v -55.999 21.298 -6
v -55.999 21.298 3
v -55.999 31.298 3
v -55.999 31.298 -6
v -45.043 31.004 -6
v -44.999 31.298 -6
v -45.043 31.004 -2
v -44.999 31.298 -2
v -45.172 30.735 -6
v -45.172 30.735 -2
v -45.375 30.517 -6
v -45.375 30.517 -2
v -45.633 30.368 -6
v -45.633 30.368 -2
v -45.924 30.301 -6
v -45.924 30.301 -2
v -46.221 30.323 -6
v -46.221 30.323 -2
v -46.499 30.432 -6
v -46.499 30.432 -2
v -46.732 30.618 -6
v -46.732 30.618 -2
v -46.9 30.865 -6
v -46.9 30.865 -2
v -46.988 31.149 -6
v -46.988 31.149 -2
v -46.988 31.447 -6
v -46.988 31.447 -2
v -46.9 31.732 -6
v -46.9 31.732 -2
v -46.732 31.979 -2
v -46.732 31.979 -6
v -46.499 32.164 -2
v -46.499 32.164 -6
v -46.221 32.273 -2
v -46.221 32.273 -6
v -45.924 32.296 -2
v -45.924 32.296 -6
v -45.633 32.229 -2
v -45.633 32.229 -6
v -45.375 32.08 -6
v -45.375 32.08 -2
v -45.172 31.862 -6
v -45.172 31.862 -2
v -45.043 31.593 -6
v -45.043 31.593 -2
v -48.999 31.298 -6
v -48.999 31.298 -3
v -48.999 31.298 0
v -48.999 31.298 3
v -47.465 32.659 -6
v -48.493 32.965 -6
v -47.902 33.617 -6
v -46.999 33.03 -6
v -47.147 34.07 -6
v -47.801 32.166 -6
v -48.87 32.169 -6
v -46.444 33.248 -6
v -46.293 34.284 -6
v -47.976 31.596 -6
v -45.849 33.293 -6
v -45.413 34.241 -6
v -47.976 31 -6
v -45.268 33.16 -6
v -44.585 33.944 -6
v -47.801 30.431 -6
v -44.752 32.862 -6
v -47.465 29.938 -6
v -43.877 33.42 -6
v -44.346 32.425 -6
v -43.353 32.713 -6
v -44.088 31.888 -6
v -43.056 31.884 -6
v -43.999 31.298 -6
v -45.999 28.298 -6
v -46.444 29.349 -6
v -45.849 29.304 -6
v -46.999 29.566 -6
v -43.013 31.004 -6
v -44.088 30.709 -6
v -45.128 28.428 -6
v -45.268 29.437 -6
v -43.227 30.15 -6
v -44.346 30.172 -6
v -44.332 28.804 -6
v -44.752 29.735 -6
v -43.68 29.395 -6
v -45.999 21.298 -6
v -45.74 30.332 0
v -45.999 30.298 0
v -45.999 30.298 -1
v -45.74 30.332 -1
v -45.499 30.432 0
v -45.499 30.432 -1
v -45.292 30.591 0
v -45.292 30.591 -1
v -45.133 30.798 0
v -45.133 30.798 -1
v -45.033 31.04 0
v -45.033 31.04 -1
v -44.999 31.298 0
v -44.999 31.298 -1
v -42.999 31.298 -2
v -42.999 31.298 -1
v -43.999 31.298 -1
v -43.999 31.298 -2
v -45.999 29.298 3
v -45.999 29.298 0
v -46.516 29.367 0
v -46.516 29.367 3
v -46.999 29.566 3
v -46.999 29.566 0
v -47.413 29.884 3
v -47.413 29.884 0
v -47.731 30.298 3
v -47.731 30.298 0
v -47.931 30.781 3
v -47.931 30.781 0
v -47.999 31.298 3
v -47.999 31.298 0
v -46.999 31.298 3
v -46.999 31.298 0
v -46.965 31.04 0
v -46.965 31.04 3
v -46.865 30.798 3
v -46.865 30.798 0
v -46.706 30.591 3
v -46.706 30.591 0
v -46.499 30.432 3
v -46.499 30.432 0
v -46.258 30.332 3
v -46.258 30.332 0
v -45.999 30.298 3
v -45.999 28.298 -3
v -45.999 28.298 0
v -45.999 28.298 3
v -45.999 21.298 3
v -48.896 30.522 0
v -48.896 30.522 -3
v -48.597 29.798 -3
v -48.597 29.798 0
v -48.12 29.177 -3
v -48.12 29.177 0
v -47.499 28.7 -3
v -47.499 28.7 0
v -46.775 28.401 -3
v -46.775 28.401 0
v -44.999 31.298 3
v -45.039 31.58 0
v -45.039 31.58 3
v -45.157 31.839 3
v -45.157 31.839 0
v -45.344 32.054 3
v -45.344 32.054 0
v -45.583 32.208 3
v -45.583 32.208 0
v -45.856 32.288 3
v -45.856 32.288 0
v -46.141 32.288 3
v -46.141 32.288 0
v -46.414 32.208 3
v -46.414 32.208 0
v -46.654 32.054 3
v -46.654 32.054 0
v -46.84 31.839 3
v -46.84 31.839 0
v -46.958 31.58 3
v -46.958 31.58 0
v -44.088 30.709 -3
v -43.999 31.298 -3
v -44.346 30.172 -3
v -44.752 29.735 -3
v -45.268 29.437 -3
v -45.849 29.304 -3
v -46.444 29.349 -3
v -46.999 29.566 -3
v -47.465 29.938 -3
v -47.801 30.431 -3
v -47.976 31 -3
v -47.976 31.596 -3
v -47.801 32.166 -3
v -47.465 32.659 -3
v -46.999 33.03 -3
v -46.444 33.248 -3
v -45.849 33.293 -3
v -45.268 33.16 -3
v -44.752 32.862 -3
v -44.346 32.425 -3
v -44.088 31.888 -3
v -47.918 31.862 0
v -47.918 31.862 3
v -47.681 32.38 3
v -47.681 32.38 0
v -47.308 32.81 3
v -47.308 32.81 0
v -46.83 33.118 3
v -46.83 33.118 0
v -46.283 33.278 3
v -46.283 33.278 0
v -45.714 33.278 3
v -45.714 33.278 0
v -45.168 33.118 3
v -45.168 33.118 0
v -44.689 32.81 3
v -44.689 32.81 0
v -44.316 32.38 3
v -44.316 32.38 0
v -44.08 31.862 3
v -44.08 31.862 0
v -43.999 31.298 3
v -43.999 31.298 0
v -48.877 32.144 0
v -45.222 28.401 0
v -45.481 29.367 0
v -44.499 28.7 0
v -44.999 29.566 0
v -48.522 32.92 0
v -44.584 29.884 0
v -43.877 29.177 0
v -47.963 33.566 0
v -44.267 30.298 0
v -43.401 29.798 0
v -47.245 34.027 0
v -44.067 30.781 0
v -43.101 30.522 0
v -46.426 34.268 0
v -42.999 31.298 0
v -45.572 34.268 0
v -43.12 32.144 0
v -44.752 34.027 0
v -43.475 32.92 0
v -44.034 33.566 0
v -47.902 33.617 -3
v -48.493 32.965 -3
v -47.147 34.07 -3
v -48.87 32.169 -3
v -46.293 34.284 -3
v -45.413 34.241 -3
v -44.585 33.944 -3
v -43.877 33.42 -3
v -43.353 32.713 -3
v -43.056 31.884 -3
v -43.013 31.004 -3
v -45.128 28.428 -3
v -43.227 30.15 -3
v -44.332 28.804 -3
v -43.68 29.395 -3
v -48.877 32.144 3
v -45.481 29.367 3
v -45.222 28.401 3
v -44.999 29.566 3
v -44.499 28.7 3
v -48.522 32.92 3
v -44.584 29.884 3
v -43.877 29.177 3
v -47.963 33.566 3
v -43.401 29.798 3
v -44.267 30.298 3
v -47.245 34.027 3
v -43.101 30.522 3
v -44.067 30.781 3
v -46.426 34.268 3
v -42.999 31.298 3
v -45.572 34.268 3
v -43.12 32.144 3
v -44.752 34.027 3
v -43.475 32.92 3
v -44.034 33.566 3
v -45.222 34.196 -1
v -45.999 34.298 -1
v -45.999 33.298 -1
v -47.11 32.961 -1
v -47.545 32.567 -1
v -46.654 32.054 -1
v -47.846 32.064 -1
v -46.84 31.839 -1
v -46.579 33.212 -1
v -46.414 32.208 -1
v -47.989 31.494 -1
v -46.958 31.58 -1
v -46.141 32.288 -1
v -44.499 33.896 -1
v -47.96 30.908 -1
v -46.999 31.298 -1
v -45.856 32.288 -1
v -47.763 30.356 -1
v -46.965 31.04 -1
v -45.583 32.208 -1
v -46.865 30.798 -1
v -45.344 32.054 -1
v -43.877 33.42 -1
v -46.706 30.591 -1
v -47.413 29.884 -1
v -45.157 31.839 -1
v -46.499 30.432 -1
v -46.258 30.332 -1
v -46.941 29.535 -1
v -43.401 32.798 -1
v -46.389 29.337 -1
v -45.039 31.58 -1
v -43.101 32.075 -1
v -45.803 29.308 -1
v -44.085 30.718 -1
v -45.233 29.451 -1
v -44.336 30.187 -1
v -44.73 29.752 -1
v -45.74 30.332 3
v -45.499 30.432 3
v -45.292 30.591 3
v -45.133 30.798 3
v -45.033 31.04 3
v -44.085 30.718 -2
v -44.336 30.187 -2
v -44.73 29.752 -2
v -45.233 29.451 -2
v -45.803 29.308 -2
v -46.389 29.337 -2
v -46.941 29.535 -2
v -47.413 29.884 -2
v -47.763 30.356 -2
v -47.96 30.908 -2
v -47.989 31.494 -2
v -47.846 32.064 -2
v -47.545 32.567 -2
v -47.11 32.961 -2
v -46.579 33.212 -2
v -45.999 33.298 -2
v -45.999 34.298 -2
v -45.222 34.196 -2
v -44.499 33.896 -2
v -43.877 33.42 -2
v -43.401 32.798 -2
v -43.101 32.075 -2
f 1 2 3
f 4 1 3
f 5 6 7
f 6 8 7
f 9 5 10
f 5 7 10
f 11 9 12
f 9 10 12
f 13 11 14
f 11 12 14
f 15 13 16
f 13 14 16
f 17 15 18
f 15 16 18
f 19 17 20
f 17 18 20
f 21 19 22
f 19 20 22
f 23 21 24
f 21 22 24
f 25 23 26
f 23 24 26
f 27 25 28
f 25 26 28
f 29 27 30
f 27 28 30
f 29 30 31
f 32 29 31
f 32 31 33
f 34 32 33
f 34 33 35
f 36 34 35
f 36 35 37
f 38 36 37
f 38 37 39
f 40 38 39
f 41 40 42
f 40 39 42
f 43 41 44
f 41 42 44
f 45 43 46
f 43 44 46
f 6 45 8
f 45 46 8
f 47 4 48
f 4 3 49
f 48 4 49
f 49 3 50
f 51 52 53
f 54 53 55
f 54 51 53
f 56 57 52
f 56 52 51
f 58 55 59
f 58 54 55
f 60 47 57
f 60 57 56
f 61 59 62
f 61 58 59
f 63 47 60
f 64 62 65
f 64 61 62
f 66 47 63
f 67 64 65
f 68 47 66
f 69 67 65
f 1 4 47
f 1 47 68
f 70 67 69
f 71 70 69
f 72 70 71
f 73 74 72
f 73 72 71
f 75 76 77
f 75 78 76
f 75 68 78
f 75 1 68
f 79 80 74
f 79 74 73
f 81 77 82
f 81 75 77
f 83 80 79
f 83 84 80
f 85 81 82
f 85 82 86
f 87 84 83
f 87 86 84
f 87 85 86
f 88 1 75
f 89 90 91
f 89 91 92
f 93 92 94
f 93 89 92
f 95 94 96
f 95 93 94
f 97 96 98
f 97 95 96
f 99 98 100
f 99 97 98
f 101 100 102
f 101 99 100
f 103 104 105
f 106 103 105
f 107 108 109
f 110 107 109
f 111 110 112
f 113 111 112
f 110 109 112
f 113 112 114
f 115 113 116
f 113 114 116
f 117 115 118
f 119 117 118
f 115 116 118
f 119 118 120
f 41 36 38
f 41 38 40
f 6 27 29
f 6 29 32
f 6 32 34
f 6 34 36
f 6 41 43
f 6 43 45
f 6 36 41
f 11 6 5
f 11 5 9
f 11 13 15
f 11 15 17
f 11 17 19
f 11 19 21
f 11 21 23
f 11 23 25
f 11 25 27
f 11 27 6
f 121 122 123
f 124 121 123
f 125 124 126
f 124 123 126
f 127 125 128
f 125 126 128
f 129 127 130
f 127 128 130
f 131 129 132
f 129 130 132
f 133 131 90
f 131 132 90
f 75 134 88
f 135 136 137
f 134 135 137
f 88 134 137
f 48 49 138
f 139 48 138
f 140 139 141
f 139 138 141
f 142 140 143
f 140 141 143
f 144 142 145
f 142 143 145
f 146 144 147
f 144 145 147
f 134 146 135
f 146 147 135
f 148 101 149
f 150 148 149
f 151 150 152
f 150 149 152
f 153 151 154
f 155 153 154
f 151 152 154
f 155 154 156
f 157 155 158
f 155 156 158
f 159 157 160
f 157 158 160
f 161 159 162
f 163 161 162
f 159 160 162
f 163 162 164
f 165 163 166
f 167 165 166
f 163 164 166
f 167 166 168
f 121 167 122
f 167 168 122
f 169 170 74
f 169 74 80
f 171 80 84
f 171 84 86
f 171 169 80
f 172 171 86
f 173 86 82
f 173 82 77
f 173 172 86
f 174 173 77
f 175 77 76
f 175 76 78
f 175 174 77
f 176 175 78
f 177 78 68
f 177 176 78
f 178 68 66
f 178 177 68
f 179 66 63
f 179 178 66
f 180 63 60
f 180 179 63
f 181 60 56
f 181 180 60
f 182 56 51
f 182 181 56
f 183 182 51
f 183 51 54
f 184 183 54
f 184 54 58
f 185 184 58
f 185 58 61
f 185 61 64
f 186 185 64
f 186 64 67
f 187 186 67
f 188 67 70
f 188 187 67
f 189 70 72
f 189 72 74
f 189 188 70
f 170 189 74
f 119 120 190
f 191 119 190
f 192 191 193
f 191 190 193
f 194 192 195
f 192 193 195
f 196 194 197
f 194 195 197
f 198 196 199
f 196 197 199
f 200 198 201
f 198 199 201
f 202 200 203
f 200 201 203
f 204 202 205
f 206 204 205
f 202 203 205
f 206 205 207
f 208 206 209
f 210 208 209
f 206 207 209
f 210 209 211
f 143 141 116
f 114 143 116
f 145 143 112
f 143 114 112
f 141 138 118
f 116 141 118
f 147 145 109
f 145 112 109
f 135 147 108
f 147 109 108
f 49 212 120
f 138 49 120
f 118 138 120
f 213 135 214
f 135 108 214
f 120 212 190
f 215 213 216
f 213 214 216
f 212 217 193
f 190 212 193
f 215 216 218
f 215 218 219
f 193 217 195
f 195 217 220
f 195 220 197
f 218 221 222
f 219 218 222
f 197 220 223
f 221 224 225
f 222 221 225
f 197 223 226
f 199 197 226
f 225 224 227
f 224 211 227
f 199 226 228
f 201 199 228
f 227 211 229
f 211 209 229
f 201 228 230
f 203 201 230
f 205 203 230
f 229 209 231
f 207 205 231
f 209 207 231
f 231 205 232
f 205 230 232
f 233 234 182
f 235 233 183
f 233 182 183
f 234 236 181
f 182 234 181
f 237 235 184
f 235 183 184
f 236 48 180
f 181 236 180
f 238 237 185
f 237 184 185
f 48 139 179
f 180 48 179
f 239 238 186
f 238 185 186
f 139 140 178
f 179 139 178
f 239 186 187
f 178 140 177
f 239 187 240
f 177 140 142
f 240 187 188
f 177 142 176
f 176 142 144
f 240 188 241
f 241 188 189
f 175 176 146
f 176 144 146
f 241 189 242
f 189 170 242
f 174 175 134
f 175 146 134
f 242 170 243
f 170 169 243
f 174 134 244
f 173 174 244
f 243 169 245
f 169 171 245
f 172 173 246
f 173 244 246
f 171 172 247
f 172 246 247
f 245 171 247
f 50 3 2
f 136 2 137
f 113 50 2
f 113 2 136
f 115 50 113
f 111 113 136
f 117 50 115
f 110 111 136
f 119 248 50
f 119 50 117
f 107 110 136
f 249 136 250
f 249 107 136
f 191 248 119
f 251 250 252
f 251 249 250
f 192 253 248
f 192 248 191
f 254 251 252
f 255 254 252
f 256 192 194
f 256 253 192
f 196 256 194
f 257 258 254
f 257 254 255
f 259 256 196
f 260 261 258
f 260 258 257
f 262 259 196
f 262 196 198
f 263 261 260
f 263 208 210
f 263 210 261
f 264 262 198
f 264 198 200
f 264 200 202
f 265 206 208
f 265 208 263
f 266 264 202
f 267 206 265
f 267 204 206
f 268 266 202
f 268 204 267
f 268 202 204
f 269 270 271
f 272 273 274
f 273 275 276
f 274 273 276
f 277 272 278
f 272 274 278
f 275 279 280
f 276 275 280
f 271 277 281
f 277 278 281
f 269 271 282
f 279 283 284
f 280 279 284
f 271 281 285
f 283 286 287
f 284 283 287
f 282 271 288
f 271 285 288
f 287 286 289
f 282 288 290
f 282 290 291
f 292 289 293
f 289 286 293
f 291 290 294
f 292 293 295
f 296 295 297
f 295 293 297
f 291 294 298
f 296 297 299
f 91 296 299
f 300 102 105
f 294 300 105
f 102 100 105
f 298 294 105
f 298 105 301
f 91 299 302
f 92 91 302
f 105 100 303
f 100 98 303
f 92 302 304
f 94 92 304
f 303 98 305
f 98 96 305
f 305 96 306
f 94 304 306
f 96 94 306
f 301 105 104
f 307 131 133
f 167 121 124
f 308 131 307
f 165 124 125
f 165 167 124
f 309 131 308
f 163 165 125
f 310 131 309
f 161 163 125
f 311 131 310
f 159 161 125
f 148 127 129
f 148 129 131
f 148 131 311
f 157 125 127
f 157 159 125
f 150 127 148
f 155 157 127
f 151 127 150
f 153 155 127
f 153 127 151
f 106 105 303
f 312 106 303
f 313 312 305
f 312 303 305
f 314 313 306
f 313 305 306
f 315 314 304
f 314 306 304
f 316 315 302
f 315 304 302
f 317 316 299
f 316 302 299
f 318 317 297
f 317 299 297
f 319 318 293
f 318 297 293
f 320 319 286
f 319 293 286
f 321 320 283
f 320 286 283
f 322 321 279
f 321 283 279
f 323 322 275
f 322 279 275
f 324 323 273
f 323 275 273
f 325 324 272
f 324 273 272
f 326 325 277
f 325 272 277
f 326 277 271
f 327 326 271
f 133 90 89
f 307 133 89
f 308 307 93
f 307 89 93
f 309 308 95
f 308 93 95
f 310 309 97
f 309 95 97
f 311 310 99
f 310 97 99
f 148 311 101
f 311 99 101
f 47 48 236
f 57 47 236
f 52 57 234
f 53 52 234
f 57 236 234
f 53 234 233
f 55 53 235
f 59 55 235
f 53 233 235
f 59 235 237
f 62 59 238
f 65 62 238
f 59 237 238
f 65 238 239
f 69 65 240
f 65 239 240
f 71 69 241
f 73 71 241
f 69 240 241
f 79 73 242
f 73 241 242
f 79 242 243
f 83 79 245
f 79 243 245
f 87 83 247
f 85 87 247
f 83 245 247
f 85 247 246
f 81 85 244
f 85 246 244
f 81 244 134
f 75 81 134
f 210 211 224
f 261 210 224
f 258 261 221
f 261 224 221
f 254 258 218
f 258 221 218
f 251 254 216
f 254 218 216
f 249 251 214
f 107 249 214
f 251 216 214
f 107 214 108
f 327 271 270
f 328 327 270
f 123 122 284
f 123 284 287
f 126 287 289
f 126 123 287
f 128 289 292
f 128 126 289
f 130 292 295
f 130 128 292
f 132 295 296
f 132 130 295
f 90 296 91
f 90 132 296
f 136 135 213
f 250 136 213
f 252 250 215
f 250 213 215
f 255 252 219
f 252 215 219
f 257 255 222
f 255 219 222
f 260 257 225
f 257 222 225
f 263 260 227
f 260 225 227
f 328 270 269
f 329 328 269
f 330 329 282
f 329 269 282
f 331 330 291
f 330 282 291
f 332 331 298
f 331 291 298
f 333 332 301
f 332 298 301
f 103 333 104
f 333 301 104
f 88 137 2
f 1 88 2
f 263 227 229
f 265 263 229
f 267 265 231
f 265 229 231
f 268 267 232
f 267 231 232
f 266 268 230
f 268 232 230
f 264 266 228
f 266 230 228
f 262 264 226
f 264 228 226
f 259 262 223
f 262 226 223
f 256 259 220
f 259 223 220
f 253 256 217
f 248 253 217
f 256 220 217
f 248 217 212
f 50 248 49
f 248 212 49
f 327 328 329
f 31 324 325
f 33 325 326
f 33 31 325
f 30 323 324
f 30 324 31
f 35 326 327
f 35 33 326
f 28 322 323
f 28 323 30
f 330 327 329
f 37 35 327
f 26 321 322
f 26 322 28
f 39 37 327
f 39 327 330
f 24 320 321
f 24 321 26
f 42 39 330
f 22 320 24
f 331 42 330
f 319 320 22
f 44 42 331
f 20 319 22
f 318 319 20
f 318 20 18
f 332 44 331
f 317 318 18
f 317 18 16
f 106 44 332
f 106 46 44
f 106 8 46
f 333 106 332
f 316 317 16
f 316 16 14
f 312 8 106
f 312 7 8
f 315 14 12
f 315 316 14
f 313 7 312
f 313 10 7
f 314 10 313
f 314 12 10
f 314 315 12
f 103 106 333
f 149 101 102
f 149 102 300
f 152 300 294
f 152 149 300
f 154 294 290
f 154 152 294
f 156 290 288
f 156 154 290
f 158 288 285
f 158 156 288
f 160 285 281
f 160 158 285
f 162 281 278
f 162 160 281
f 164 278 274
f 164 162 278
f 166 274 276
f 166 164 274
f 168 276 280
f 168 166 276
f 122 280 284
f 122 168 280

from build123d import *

# Parameters (mm, degrees)
F1_DEPTH  = 3
F2_DEPTH  = 1
F3_DEPTH  = 1
F5_DEPTH  = 1
F6_DEPTH  = 1
F8_DEPTH  = 1
F7_R      = 1
F9_DEPTH  = 1
F11_DEPTH = 3
F12_R     = 2
F13_DEPTH = 3
F14_DEPTH = 3


with BuildPart() as f1:
    # F0 (on Top) → F1 (new body)
    with BuildSketch(Plane.XY):
        with BuildLine():
            Line((-48.9987007827, 31.2983999767), (-55.9987007827, 31.2983999767))
            Line((-55.9987007827, 31.2983999767), (-55.9987007827, 21.2983999767))
            Line((-55.9987007827, 21.2983999767), (-45.9987007827, 21.2983999767))
            Line((-45.9987007827, 21.2983999767), (-45.9987007827, 28.2983999767))
            ThreePointArc((-45.9987007827, 28.2983999767), (-48.1200211262, 29.1770796331), (-48.9987007827, 31.2983999767))
        make_face()
        with BuildLine():
            ThreePointArc((-42.9987007827, 31.2983999767), (-45.9987007827, 34.2983999767), (-48.9987007827, 31.2983999767))
            Line((-48.9987007827, 31.2983999767), (-47.9987007827, 31.2983999767))
            ThreePointArc((-47.9987007827, 31.2983999767), (-45.9987007827, 33.2983999767), (-43.9987007827, 31.2983999767))
            ThreePointArc((-43.9987007827, 31.2983999767), (-44.5844872203, 29.8841864143), (-45.9987007827, 29.2983999767))
            Line((-45.9987007827, 29.2983999767), (-45.9987007827, 28.2983999767))
            ThreePointArc((-45.9987007827, 28.2983999767), (-43.8773804391, 29.1770796331), (-42.9987007827, 31.2983999767))
        make_face()
        with BuildLine():
            Line((-47.9987007827, 31.2983999767), (-48.9987007827, 31.2983999767))
            ThreePointArc((-48.9987007827, 31.2983999767), (-48.1200211262, 29.1770796331), (-45.9987007827, 28.2983999767))
            Line((-45.9987007827, 28.2983999767), (-45.9987007827, 29.2983999767))
            ThreePointArc((-45.9987007827, 29.2983999767), (-47.412914345, 29.8841864143), (-47.9987007827, 31.2983999767))
        make_face()
    extrude(amount=F1_DEPTH)

    # F0 (on Top) → F2 (join)
    with BuildSketch(Plane.XY):
        with BuildLine():
            Line((-48.9987007827, 31.2983999767), (-55.9987007827, 31.2983999767))
            Line((-55.9987007827, 31.2983999767), (-55.9987007827, 21.2983999767))
            Line((-55.9987007827, 21.2983999767), (-45.9987007827, 21.2983999767))
            Line((-45.9987007827, 21.2983999767), (-45.9987007827, 28.2983999767))
            ThreePointArc((-45.9987007827, 28.2983999767), (-48.1200211262, 29.1770796331), (-48.9987007827, 31.2983999767))
        make_face()
    extrude(amount=-F2_DEPTH)

    # F4 (on face) → F5 (join)
    with BuildSketch(Plane(origin=(0, 0, -1), x_dir=(1, 0, 0), z_dir=(0, 0, -1))):
        with BuildLine():
            ThreePointArc((-48.9987007827, -31.2983999767), (-48.1200211262, -29.1770796331), (-45.9987007827, -28.2983999767))
            Line((-45.9987007827, -28.2983999767), (-45.9987007827, -21.2983999767))
            Line((-45.9987007827, -21.2983999767), (-55.9987007827, -21.2983999767))
            Line((-55.9987007827, -21.2983999767), (-55.9987007827, -31.2983999767))
            Line((-55.9987007827, -31.2983999767), (-48.9987007827, -31.2983999767))
        make_face()
    extrude(amount=F5_DEPTH)

    # F7 (on face) → F8 (join)
    with BuildSketch(Plane(origin=(0, 0, -2), x_dir=(1, 0, 0), z_dir=(0, 0, -1))):
        with BuildLine():
            Line((-55.9987007827, -31.2983999767), (-48.9987007827, -31.2983999767))
            ThreePointArc((-48.9987007827, -31.2983999767), (-48.1200211262, -29.1770796331), (-45.9987007827, -28.2983999767))
            Line((-45.9987007827, -28.2983999767), (-45.9987007827, -21.2983999767))
            Line((-45.9987007827, -21.2983999767), (-55.9987007827, -21.2983999767))
            Line((-55.9987007827, -21.2983999767), (-55.9987007827, -31.2983999767))
        make_face()
    extrude(amount=F8_DEPTH)

    # F10 (on face) → F11 (join)
    with BuildSketch(Plane(origin=(0, 0, -3), x_dir=(1, 0, 0), z_dir=(0, 0, -1))):
        with BuildLine():
            Line((-55.9987007827, -21.2983999767), (-55.9987007827, -31.2983999767))
            Line((-55.9987007827, -31.2983999767), (-48.9987007827, -31.2983999767))
            ThreePointArc((-48.9987007827, -31.2983999767), (-48.1200211262, -29.1770796331), (-45.9987007827, -28.2983999767))
            Line((-45.9987007827, -28.2983999767), (-45.9987007827, -21.2983999767))
            Line((-45.9987007827, -21.2983999767), (-55.9987007827, -21.2983999767))
        make_face()
    extrude(amount=F11_DEPTH)

    # F12 (on face) → F13 (join, through all)
    with BuildSketch(Plane(origin=(0, 0, -3), x_dir=(1, 0, 0), z_dir=(0, 0, -1))):
        with BuildLine():
            ThreePointArc((-48.9987007827, -31.2983999767), (-43.8773804391, -33.4197203202), (-45.9987007827, -28.2983999767))
            ThreePointArc((-45.9987007827, -28.2983999767), (-48.1200211262, -29.1770796331), (-48.9987007827, -31.2983999767))
        make_face()
        with Locations((-45.9987007827, -31.2983999767)):
            Circle(F12_R, mode=Mode.SUBTRACT)
    extrude(amount=F13_DEPTH)


with BuildPart() as f1b:
    # F0 (on Top) → F1, piece 2 (new body)
    with BuildSketch(Plane.XY):
        with BuildLine():
            Line((-45.9987007827, 31.2983999767), (-46.9987007827, 31.2983999767))
            ThreePointArc((-46.9987007827, 31.2983999767), (-46.7058075638, 30.5912931955), (-45.9987007827, 30.2983999767))
            Line((-45.9987007827, 30.2983999767), (-45.9987007827, 31.2983999767))
        make_face()
        with BuildLine():
            ThreePointArc((-44.9987007827, 31.2983999767), (-45.9987007827, 32.2983999767), (-46.9987007827, 31.2983999767))
            Line((-46.9987007827, 31.2983999767), (-45.9987007827, 31.2983999767))
            Line((-45.9987007827, 31.2983999767), (-45.9987007827, 30.2983999767))
            ThreePointArc((-45.9987007827, 30.2983999767), (-45.2915940015, 30.5912931955), (-44.9987007827, 31.2983999767))
        make_face()
    extrude(amount=F1_DEPTH)

    # F0 (on Top) → F3 (join)
    with BuildSketch(Plane.XY):
        with BuildLine():
            Line((-45.9987007827, 31.2983999767), (-46.9987007827, 31.2983999767))
            ThreePointArc((-46.9987007827, 31.2983999767), (-46.7058075638, 30.5912931955), (-45.9987007827, 30.2983999767))
            Line((-45.9987007827, 30.2983999767), (-45.9987007827, 31.2983999767))
        make_face()
        with BuildLine():
            ThreePointArc((-44.9987007827, 31.2983999767), (-45.9987007827, 32.2983999767), (-46.9987007827, 31.2983999767))
            Line((-46.9987007827, 31.2983999767), (-45.9987007827, 31.2983999767))
            Line((-45.9987007827, 31.2983999767), (-45.9987007827, 30.2983999767))
            ThreePointArc((-45.9987007827, 30.2983999767), (-45.2915940015, 30.5912931955), (-44.9987007827, 31.2983999767))
        make_face()
    extrude(amount=-F3_DEPTH)

    # F4 (on face) → F6 (join)
    with BuildSketch(Plane(origin=(0, 0, -1), x_dir=(1, 0, 0), z_dir=(0, 0, -1))):
        with BuildLine():
            Line((-45.9987007827, -31.2983999767), (-44.9987007827, -31.2983999767))
            ThreePointArc((-44.9987007827, -31.2983999767), (-46.7058075638, -30.5912931955), (-45.9987007827, -32.2983999767))
            Line((-45.9987007827, -32.2983999767), (-45.9987007827, -31.2983999767))
        make_face()
        with BuildLine():
            Line((-44.9987007827, -31.2983999767), (-43.9987007827, -31.2983999767))
            ThreePointArc((-43.9987007827, -31.2983999767), (-47.412914345, -29.8841864143), (-45.9987007827, -33.2983999767))
            Line((-45.9987007827, -33.2983999767), (-45.9987007827, -32.2983999767))
            ThreePointArc((-45.9987007827, -32.2983999767), (-46.7058075638, -30.5912931955), (-44.9987007827, -31.2983999767))
        make_face()
        with BuildLine():
            ThreePointArc((-45.9987007827, -33.2983999767), (-44.5844872203, -32.712613539), (-43.9987007827, -31.2983999767))
            Line((-43.9987007827, -31.2983999767), (-44.9987007827, -31.2983999767))
            ThreePointArc((-44.9987007827, -31.2983999767), (-45.2915940015, -32.0055067579), (-45.9987007827, -32.2983999767))
            Line((-45.9987007827, -32.2983999767), (-45.9987007827, -33.2983999767))
        make_face()
        with BuildLine():
            ThreePointArc((-45.9987007827, -34.2983999767), (-43.8773804391, -33.4197203202), (-42.9987007827, -31.2983999767))
            Line((-42.9987007827, -31.2983999767), (-43.9987007827, -31.2983999767))
            ThreePointArc((-43.9987007827, -31.2983999767), (-44.5844872203, -32.712613539), (-45.9987007827, -33.2983999767))
            Line((-45.9987007827, -33.2983999767), (-45.9987007827, -34.2983999767))
        make_face()
        with BuildLine():
            ThreePointArc((-45.9987007827, -32.2983999767), (-45.2915940015, -32.0055067579), (-44.9987007827, -31.2983999767))
            Line((-44.9987007827, -31.2983999767), (-45.9987007827, -31.2983999767))
            Line((-45.9987007827, -31.2983999767), (-45.9987007827, -32.2983999767))
        make_face()
    extrude(amount=F6_DEPTH)

    # F7 (on face) → F9 (join)
    with BuildSketch(Plane(origin=(0, 0, -2), x_dir=(1, 0, 0), z_dir=(0, 0, -1))):
        with Locations((-45.9987007827, -31.2983999767)):
            Circle(F7_R)
    extrude(amount=F9_DEPTH)

    # F14 (add, through all): a face of the model
    f14_faces = [f1b.faces().sort_by_distance(p)[0] for p in [
        (-45.9987007827, 31.2983999767, -3),
    ]]
    extrude(f14_faces, amount=F14_DEPTH)


solid = Compound([f1.part, f1b.part])
